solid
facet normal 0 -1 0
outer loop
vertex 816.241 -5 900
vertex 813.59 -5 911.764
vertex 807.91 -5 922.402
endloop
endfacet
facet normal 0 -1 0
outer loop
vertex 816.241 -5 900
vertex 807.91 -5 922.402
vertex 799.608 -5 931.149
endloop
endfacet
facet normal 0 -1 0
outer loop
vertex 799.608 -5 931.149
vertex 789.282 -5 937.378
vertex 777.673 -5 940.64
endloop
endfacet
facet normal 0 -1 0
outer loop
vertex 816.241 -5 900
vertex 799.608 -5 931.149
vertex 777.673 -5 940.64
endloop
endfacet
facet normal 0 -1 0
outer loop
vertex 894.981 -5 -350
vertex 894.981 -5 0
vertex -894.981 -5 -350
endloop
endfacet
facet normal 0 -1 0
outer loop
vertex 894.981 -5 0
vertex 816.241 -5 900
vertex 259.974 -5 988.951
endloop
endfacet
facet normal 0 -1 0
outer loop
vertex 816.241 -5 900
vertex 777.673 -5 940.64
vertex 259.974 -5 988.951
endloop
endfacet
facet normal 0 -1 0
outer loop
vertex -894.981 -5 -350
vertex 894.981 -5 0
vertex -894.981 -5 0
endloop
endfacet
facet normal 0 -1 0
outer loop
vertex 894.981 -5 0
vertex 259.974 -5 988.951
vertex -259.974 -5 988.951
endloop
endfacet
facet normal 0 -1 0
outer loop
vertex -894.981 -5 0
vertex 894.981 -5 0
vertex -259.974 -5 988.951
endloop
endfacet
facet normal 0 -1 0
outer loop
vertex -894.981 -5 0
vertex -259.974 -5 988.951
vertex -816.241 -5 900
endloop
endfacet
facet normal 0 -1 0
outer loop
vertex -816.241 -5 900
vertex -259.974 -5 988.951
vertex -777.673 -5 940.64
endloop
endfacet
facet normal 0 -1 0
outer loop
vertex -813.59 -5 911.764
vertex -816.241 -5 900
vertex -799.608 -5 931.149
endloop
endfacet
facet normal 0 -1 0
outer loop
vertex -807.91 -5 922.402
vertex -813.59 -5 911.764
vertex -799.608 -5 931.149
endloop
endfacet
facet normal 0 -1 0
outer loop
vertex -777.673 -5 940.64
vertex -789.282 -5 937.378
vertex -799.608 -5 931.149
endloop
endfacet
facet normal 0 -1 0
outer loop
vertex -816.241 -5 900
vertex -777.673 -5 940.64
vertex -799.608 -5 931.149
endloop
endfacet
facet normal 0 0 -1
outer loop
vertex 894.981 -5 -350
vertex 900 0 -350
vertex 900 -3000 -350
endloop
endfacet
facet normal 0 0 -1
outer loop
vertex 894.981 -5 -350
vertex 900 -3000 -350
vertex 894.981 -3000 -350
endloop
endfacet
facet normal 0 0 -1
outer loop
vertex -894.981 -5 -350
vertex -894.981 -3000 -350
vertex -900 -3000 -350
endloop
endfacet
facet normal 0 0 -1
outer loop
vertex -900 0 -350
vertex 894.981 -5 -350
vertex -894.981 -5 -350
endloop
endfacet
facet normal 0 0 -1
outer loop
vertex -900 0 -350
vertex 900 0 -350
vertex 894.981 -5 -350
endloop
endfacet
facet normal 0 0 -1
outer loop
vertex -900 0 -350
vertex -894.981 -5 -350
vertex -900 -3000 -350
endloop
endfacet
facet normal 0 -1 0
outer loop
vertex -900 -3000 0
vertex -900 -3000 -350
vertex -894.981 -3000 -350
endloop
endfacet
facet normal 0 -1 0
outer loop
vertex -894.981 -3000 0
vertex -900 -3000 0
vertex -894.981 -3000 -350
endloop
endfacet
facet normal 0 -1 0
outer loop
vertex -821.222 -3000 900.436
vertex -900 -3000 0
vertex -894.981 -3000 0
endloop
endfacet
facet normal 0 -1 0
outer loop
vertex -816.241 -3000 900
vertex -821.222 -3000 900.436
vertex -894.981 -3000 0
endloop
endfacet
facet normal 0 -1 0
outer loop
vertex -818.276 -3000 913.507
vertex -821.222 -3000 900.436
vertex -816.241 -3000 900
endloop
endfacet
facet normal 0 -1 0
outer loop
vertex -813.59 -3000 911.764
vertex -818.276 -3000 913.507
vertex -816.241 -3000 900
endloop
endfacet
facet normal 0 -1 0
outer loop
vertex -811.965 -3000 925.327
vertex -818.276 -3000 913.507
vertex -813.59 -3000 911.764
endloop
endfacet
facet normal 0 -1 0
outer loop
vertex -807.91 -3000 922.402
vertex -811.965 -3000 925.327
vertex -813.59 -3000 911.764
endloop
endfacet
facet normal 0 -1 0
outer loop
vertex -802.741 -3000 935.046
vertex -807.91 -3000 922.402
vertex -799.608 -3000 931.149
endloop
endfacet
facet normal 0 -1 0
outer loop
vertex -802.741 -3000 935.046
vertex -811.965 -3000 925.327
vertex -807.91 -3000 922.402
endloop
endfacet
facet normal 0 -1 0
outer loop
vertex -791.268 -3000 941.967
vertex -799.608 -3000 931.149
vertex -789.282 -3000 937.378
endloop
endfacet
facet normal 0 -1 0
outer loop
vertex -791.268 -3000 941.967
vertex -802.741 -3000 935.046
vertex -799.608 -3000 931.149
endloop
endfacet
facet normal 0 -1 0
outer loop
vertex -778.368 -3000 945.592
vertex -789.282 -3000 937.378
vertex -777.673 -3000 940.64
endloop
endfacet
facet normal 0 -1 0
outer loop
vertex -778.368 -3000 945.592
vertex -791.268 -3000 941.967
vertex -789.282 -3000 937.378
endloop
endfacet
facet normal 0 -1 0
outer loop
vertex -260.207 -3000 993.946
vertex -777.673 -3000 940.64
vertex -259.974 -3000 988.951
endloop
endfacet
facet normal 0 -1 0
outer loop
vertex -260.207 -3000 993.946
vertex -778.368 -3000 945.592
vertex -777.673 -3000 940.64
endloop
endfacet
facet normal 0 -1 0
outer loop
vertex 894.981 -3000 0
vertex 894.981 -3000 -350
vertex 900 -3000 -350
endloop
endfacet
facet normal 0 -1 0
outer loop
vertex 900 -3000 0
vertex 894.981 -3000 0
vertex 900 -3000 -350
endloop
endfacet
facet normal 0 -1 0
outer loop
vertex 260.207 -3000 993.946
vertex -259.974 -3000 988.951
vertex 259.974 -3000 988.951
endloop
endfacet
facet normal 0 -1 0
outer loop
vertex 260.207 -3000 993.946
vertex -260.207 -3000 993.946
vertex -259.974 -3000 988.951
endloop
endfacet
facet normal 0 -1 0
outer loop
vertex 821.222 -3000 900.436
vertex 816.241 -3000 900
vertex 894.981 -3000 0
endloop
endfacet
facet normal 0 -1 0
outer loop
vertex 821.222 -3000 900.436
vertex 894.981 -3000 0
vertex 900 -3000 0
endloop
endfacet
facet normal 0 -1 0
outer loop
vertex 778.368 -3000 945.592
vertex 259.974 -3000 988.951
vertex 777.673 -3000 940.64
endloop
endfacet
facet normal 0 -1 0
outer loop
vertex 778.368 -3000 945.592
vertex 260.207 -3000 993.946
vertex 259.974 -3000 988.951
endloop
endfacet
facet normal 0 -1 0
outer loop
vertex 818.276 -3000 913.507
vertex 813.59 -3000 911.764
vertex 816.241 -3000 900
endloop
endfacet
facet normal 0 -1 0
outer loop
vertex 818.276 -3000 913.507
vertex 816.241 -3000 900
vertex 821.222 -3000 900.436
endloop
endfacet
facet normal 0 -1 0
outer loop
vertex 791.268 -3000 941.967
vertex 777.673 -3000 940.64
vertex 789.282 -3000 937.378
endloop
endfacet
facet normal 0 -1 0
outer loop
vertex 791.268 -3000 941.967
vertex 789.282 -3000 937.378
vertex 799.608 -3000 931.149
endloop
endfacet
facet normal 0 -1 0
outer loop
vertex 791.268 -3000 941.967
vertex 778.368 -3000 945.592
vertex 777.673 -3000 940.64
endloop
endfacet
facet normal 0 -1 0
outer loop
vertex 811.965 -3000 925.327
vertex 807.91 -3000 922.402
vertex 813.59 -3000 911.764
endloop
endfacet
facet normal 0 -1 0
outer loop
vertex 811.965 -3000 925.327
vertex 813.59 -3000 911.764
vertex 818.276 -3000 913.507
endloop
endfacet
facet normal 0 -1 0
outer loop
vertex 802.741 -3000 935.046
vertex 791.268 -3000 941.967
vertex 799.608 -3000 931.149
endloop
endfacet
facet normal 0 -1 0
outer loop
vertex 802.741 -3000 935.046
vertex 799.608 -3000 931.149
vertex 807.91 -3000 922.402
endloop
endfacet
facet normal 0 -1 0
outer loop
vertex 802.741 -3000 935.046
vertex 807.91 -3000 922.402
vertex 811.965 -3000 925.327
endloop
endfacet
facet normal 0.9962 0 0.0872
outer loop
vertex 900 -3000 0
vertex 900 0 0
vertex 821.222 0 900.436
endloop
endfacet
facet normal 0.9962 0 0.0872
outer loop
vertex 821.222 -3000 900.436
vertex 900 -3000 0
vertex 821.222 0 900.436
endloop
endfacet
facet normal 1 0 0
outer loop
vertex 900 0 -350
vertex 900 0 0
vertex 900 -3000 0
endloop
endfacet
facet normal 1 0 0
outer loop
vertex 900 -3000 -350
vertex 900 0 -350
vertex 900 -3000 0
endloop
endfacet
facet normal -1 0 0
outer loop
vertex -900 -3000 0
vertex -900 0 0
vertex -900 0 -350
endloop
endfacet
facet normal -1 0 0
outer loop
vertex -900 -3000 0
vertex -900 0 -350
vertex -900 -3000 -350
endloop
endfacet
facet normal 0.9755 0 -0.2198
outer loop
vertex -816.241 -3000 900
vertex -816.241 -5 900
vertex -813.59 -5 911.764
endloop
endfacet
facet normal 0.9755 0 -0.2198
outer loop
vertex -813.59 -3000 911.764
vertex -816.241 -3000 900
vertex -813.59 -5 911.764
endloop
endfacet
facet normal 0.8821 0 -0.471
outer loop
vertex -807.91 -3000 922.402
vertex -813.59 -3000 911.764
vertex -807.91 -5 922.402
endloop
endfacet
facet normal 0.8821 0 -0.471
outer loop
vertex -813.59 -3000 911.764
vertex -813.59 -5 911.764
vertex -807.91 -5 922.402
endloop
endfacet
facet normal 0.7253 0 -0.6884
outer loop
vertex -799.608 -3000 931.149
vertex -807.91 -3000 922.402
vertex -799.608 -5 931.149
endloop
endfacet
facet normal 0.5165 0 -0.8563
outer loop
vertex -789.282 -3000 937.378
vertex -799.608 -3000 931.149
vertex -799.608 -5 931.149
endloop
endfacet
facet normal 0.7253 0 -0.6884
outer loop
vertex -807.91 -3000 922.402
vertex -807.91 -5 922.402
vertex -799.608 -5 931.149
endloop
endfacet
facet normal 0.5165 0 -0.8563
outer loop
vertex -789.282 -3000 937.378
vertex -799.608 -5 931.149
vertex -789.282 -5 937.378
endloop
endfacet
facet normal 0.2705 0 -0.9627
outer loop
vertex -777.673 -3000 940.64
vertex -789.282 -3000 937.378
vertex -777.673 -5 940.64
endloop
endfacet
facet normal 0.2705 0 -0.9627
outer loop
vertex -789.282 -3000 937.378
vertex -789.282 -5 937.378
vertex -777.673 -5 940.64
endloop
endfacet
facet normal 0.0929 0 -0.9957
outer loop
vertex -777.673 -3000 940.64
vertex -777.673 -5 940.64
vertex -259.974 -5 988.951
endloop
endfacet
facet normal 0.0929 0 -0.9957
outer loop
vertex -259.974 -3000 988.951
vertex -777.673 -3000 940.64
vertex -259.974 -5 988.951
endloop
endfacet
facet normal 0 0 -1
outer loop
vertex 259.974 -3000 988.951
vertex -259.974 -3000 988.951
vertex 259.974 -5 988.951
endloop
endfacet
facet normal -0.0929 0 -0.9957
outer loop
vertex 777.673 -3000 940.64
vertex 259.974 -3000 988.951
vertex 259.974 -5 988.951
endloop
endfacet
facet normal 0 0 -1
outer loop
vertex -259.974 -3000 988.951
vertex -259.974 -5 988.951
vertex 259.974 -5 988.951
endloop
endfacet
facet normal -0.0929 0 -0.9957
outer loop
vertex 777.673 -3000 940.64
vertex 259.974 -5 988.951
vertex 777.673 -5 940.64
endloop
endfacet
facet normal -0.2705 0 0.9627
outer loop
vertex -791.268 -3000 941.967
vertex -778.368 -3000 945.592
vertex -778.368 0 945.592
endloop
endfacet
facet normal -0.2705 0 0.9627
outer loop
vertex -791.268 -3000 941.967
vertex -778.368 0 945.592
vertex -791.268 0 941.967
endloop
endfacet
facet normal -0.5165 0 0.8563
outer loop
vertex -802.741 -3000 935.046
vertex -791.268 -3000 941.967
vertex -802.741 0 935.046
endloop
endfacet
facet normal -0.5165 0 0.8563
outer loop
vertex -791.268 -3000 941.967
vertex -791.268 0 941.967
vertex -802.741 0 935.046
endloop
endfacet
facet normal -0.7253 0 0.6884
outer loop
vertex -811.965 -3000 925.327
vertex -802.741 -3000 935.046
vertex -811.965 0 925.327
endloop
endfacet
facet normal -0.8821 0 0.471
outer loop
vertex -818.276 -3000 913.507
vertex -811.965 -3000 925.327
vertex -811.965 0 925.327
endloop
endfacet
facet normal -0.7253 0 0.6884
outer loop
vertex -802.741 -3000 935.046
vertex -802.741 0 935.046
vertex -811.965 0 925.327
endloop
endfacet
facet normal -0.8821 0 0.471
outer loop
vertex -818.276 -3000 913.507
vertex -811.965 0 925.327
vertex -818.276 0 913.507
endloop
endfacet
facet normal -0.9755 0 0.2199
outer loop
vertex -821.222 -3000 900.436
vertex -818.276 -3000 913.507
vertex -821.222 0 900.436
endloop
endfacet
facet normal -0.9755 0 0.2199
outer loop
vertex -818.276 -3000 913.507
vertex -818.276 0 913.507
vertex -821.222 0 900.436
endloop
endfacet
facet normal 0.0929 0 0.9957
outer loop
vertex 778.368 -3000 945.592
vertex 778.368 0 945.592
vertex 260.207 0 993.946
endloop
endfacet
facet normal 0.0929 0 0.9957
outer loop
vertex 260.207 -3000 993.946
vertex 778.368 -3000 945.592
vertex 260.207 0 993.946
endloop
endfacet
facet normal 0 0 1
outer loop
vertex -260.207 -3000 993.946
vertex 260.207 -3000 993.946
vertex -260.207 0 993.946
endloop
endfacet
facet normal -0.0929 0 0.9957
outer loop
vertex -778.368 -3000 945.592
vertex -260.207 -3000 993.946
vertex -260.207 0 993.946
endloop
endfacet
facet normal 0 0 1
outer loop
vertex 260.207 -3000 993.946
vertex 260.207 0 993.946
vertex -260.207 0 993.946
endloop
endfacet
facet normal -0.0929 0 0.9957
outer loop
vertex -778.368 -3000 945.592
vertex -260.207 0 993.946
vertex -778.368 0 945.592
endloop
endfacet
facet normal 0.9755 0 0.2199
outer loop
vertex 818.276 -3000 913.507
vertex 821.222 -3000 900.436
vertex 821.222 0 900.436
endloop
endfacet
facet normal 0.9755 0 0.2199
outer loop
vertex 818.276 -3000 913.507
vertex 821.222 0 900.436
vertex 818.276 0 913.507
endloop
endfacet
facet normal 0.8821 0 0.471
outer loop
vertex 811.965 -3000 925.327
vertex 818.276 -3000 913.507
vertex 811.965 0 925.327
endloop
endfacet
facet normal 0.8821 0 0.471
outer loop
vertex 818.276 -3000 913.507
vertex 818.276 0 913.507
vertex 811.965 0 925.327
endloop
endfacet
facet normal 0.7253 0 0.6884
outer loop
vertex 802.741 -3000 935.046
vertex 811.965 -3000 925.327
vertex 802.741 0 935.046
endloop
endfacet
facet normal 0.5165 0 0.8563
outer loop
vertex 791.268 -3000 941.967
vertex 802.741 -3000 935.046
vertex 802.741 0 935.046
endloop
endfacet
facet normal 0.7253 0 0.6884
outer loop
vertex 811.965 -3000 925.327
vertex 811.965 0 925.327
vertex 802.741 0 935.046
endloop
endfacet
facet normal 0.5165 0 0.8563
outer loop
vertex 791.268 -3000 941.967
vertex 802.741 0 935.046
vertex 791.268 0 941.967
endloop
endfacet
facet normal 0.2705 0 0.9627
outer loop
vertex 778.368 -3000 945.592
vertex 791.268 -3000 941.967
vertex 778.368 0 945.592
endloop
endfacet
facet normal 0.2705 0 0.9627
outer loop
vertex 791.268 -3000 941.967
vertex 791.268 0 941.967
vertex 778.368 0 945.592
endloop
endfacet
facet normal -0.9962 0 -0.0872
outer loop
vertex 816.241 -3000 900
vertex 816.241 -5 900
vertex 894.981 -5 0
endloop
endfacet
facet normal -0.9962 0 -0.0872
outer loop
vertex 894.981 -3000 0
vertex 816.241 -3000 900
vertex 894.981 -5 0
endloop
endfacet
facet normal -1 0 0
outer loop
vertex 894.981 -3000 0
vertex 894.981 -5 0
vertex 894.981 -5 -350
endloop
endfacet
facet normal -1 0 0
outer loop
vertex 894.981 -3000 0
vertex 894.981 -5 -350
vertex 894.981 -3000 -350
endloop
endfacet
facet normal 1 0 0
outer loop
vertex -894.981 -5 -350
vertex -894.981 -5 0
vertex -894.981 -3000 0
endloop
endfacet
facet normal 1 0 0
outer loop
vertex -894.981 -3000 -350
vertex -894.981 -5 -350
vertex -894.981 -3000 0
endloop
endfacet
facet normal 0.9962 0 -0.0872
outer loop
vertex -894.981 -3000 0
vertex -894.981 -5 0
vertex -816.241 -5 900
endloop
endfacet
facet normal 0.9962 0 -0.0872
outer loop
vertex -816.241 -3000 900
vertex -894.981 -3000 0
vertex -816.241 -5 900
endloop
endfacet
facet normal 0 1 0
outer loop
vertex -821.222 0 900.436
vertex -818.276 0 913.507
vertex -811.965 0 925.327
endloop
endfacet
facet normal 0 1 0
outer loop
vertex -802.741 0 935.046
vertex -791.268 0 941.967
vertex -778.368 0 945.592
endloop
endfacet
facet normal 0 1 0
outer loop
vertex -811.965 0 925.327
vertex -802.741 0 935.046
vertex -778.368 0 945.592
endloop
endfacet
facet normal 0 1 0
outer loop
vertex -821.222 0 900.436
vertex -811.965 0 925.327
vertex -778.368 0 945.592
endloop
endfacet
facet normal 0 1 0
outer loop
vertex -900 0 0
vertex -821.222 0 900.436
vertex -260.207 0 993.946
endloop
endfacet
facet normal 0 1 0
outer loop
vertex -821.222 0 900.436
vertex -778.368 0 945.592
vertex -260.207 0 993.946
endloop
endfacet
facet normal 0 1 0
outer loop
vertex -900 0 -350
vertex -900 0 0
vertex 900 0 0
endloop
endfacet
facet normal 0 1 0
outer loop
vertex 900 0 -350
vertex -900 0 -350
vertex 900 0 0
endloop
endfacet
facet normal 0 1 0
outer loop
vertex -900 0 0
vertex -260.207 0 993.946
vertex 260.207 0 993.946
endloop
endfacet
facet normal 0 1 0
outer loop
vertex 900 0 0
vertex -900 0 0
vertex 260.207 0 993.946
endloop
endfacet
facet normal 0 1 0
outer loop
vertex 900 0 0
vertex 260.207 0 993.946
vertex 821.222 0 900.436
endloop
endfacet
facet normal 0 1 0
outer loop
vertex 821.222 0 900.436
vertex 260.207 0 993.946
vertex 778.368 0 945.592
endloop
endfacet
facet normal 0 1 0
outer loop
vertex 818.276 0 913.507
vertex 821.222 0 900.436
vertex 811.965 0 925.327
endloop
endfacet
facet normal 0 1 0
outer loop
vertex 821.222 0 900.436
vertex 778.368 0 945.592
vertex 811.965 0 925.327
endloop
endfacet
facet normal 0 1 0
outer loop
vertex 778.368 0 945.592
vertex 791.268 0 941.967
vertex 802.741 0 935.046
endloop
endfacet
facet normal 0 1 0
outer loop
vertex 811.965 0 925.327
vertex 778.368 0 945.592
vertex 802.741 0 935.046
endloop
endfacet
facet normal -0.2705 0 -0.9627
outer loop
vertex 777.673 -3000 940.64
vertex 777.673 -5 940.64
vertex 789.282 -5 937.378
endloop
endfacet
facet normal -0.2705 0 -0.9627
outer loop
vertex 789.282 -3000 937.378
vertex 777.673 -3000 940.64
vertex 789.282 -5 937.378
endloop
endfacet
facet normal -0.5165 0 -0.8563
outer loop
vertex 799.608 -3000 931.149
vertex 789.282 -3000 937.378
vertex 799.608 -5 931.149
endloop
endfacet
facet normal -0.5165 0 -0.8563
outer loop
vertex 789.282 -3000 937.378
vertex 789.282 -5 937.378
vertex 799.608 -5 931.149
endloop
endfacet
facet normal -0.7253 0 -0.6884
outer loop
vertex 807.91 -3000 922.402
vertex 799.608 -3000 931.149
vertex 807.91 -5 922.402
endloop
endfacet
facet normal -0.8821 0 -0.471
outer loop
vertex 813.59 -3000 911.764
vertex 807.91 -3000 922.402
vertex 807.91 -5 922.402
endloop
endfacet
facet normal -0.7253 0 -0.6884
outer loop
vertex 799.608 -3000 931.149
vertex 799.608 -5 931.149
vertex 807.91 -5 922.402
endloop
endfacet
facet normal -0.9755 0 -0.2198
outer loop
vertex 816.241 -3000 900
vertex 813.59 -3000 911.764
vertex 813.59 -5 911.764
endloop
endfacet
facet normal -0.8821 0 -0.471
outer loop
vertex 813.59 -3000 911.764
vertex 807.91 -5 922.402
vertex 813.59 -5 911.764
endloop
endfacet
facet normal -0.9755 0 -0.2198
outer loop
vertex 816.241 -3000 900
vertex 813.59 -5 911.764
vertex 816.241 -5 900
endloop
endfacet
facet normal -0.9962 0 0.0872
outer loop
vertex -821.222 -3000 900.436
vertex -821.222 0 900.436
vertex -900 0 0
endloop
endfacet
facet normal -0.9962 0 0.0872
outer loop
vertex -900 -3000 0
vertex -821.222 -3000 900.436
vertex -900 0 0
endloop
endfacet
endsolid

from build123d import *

# Parameters (mm, degrees)
F1_DEPTH = 3000
F3_DEPTH = 5
F4_DEPTH = 350


# Not quite as in the source:
# - ends of sketch curves that miss each other by under 0.0002 mm in the source are joined


with BuildPart() as f1:
    # F0 (on Front) → F1 (new body)
    with BuildSketch(Plane.XZ):
        with BuildLine():
            Line((-821.2220771658, 900.4357782981), (-900, 0))
            Line((-900, 0), (-894.9809055989, 0))
            Line((-894.9809055989, 0), (-816.2411084255, 900))
            ThreePointArc((-816.2411084255, 900), (-804.0533773431, 927.0548092338), (-777.6727873626, 940.6403884962))
            ThreePointArc((-777.6727873626, 940.6403884962), (0, 995.0000047684), (777.6727873915, 940.640388702))
            ThreePointArc((777.6727873915, 940.640388702), (804.0533773431, 927.0548092338), (816.2411084255, 900))
            Line((816.2411084255, 900), (894.9809008123, 0))
            Line((894.9809008123, 0), (900, 0))
            Line((900, 0), (821.2220771658, 900.4357782981))
            ThreePointArc((821.2220771658, 900.4357782981), (807.6801551758, 930.4966742615), (778.3683916368, 945.5917607313))
            ThreePointArc((778.3683916368, 945.5917607313), (0, 999.9999997922), (-778.3683916368, 945.5917607313))
            ThreePointArc((-778.3683916368, 945.5917607313), (-807.6801551758, 930.4966742615), (-821.2220771658, 900.4357782981))
        make_face()
    extrude(amount=F1_DEPTH)

    # F2 (on face) → F3 (join)
    with BuildSketch(Plane(origin=(0, 0, 0), x_dir=(-1, 0, 0), z_dir=(0, 1, 0))):
        with BuildLine():
            Line((-816.2411084255, 900), (-894.9809008123, 0))
            Line((-894.9809008123, 0), (894.9809055989, 0))
            Line((894.9809055989, 0), (816.2411084255, 900))
            ThreePointArc((816.2411084255, 900), (804.0533773431, 927.0548092338), (777.6727873626, 940.6403884962))
            ThreePointArc((777.6727873626, 940.6403884962), (-7.3e-09, 995.0000047684), (-777.6727873915, 940.640388702))
            ThreePointArc((-777.6727873915, 940.640388702), (-804.0533773182, 927.0548092601), (-816.2411084255, 900))
        make_face()
    extrude(amount=-F3_DEPTH)

    # F4 (add): a face of the model
    f4_faces = [f1.faces().sort_by_distance(p)[0] for p in [
        (898.4794719492, -1502.5, 0),
    ]]
    extrude(f4_faces, amount=F4_DEPTH)


solid = f1.part
